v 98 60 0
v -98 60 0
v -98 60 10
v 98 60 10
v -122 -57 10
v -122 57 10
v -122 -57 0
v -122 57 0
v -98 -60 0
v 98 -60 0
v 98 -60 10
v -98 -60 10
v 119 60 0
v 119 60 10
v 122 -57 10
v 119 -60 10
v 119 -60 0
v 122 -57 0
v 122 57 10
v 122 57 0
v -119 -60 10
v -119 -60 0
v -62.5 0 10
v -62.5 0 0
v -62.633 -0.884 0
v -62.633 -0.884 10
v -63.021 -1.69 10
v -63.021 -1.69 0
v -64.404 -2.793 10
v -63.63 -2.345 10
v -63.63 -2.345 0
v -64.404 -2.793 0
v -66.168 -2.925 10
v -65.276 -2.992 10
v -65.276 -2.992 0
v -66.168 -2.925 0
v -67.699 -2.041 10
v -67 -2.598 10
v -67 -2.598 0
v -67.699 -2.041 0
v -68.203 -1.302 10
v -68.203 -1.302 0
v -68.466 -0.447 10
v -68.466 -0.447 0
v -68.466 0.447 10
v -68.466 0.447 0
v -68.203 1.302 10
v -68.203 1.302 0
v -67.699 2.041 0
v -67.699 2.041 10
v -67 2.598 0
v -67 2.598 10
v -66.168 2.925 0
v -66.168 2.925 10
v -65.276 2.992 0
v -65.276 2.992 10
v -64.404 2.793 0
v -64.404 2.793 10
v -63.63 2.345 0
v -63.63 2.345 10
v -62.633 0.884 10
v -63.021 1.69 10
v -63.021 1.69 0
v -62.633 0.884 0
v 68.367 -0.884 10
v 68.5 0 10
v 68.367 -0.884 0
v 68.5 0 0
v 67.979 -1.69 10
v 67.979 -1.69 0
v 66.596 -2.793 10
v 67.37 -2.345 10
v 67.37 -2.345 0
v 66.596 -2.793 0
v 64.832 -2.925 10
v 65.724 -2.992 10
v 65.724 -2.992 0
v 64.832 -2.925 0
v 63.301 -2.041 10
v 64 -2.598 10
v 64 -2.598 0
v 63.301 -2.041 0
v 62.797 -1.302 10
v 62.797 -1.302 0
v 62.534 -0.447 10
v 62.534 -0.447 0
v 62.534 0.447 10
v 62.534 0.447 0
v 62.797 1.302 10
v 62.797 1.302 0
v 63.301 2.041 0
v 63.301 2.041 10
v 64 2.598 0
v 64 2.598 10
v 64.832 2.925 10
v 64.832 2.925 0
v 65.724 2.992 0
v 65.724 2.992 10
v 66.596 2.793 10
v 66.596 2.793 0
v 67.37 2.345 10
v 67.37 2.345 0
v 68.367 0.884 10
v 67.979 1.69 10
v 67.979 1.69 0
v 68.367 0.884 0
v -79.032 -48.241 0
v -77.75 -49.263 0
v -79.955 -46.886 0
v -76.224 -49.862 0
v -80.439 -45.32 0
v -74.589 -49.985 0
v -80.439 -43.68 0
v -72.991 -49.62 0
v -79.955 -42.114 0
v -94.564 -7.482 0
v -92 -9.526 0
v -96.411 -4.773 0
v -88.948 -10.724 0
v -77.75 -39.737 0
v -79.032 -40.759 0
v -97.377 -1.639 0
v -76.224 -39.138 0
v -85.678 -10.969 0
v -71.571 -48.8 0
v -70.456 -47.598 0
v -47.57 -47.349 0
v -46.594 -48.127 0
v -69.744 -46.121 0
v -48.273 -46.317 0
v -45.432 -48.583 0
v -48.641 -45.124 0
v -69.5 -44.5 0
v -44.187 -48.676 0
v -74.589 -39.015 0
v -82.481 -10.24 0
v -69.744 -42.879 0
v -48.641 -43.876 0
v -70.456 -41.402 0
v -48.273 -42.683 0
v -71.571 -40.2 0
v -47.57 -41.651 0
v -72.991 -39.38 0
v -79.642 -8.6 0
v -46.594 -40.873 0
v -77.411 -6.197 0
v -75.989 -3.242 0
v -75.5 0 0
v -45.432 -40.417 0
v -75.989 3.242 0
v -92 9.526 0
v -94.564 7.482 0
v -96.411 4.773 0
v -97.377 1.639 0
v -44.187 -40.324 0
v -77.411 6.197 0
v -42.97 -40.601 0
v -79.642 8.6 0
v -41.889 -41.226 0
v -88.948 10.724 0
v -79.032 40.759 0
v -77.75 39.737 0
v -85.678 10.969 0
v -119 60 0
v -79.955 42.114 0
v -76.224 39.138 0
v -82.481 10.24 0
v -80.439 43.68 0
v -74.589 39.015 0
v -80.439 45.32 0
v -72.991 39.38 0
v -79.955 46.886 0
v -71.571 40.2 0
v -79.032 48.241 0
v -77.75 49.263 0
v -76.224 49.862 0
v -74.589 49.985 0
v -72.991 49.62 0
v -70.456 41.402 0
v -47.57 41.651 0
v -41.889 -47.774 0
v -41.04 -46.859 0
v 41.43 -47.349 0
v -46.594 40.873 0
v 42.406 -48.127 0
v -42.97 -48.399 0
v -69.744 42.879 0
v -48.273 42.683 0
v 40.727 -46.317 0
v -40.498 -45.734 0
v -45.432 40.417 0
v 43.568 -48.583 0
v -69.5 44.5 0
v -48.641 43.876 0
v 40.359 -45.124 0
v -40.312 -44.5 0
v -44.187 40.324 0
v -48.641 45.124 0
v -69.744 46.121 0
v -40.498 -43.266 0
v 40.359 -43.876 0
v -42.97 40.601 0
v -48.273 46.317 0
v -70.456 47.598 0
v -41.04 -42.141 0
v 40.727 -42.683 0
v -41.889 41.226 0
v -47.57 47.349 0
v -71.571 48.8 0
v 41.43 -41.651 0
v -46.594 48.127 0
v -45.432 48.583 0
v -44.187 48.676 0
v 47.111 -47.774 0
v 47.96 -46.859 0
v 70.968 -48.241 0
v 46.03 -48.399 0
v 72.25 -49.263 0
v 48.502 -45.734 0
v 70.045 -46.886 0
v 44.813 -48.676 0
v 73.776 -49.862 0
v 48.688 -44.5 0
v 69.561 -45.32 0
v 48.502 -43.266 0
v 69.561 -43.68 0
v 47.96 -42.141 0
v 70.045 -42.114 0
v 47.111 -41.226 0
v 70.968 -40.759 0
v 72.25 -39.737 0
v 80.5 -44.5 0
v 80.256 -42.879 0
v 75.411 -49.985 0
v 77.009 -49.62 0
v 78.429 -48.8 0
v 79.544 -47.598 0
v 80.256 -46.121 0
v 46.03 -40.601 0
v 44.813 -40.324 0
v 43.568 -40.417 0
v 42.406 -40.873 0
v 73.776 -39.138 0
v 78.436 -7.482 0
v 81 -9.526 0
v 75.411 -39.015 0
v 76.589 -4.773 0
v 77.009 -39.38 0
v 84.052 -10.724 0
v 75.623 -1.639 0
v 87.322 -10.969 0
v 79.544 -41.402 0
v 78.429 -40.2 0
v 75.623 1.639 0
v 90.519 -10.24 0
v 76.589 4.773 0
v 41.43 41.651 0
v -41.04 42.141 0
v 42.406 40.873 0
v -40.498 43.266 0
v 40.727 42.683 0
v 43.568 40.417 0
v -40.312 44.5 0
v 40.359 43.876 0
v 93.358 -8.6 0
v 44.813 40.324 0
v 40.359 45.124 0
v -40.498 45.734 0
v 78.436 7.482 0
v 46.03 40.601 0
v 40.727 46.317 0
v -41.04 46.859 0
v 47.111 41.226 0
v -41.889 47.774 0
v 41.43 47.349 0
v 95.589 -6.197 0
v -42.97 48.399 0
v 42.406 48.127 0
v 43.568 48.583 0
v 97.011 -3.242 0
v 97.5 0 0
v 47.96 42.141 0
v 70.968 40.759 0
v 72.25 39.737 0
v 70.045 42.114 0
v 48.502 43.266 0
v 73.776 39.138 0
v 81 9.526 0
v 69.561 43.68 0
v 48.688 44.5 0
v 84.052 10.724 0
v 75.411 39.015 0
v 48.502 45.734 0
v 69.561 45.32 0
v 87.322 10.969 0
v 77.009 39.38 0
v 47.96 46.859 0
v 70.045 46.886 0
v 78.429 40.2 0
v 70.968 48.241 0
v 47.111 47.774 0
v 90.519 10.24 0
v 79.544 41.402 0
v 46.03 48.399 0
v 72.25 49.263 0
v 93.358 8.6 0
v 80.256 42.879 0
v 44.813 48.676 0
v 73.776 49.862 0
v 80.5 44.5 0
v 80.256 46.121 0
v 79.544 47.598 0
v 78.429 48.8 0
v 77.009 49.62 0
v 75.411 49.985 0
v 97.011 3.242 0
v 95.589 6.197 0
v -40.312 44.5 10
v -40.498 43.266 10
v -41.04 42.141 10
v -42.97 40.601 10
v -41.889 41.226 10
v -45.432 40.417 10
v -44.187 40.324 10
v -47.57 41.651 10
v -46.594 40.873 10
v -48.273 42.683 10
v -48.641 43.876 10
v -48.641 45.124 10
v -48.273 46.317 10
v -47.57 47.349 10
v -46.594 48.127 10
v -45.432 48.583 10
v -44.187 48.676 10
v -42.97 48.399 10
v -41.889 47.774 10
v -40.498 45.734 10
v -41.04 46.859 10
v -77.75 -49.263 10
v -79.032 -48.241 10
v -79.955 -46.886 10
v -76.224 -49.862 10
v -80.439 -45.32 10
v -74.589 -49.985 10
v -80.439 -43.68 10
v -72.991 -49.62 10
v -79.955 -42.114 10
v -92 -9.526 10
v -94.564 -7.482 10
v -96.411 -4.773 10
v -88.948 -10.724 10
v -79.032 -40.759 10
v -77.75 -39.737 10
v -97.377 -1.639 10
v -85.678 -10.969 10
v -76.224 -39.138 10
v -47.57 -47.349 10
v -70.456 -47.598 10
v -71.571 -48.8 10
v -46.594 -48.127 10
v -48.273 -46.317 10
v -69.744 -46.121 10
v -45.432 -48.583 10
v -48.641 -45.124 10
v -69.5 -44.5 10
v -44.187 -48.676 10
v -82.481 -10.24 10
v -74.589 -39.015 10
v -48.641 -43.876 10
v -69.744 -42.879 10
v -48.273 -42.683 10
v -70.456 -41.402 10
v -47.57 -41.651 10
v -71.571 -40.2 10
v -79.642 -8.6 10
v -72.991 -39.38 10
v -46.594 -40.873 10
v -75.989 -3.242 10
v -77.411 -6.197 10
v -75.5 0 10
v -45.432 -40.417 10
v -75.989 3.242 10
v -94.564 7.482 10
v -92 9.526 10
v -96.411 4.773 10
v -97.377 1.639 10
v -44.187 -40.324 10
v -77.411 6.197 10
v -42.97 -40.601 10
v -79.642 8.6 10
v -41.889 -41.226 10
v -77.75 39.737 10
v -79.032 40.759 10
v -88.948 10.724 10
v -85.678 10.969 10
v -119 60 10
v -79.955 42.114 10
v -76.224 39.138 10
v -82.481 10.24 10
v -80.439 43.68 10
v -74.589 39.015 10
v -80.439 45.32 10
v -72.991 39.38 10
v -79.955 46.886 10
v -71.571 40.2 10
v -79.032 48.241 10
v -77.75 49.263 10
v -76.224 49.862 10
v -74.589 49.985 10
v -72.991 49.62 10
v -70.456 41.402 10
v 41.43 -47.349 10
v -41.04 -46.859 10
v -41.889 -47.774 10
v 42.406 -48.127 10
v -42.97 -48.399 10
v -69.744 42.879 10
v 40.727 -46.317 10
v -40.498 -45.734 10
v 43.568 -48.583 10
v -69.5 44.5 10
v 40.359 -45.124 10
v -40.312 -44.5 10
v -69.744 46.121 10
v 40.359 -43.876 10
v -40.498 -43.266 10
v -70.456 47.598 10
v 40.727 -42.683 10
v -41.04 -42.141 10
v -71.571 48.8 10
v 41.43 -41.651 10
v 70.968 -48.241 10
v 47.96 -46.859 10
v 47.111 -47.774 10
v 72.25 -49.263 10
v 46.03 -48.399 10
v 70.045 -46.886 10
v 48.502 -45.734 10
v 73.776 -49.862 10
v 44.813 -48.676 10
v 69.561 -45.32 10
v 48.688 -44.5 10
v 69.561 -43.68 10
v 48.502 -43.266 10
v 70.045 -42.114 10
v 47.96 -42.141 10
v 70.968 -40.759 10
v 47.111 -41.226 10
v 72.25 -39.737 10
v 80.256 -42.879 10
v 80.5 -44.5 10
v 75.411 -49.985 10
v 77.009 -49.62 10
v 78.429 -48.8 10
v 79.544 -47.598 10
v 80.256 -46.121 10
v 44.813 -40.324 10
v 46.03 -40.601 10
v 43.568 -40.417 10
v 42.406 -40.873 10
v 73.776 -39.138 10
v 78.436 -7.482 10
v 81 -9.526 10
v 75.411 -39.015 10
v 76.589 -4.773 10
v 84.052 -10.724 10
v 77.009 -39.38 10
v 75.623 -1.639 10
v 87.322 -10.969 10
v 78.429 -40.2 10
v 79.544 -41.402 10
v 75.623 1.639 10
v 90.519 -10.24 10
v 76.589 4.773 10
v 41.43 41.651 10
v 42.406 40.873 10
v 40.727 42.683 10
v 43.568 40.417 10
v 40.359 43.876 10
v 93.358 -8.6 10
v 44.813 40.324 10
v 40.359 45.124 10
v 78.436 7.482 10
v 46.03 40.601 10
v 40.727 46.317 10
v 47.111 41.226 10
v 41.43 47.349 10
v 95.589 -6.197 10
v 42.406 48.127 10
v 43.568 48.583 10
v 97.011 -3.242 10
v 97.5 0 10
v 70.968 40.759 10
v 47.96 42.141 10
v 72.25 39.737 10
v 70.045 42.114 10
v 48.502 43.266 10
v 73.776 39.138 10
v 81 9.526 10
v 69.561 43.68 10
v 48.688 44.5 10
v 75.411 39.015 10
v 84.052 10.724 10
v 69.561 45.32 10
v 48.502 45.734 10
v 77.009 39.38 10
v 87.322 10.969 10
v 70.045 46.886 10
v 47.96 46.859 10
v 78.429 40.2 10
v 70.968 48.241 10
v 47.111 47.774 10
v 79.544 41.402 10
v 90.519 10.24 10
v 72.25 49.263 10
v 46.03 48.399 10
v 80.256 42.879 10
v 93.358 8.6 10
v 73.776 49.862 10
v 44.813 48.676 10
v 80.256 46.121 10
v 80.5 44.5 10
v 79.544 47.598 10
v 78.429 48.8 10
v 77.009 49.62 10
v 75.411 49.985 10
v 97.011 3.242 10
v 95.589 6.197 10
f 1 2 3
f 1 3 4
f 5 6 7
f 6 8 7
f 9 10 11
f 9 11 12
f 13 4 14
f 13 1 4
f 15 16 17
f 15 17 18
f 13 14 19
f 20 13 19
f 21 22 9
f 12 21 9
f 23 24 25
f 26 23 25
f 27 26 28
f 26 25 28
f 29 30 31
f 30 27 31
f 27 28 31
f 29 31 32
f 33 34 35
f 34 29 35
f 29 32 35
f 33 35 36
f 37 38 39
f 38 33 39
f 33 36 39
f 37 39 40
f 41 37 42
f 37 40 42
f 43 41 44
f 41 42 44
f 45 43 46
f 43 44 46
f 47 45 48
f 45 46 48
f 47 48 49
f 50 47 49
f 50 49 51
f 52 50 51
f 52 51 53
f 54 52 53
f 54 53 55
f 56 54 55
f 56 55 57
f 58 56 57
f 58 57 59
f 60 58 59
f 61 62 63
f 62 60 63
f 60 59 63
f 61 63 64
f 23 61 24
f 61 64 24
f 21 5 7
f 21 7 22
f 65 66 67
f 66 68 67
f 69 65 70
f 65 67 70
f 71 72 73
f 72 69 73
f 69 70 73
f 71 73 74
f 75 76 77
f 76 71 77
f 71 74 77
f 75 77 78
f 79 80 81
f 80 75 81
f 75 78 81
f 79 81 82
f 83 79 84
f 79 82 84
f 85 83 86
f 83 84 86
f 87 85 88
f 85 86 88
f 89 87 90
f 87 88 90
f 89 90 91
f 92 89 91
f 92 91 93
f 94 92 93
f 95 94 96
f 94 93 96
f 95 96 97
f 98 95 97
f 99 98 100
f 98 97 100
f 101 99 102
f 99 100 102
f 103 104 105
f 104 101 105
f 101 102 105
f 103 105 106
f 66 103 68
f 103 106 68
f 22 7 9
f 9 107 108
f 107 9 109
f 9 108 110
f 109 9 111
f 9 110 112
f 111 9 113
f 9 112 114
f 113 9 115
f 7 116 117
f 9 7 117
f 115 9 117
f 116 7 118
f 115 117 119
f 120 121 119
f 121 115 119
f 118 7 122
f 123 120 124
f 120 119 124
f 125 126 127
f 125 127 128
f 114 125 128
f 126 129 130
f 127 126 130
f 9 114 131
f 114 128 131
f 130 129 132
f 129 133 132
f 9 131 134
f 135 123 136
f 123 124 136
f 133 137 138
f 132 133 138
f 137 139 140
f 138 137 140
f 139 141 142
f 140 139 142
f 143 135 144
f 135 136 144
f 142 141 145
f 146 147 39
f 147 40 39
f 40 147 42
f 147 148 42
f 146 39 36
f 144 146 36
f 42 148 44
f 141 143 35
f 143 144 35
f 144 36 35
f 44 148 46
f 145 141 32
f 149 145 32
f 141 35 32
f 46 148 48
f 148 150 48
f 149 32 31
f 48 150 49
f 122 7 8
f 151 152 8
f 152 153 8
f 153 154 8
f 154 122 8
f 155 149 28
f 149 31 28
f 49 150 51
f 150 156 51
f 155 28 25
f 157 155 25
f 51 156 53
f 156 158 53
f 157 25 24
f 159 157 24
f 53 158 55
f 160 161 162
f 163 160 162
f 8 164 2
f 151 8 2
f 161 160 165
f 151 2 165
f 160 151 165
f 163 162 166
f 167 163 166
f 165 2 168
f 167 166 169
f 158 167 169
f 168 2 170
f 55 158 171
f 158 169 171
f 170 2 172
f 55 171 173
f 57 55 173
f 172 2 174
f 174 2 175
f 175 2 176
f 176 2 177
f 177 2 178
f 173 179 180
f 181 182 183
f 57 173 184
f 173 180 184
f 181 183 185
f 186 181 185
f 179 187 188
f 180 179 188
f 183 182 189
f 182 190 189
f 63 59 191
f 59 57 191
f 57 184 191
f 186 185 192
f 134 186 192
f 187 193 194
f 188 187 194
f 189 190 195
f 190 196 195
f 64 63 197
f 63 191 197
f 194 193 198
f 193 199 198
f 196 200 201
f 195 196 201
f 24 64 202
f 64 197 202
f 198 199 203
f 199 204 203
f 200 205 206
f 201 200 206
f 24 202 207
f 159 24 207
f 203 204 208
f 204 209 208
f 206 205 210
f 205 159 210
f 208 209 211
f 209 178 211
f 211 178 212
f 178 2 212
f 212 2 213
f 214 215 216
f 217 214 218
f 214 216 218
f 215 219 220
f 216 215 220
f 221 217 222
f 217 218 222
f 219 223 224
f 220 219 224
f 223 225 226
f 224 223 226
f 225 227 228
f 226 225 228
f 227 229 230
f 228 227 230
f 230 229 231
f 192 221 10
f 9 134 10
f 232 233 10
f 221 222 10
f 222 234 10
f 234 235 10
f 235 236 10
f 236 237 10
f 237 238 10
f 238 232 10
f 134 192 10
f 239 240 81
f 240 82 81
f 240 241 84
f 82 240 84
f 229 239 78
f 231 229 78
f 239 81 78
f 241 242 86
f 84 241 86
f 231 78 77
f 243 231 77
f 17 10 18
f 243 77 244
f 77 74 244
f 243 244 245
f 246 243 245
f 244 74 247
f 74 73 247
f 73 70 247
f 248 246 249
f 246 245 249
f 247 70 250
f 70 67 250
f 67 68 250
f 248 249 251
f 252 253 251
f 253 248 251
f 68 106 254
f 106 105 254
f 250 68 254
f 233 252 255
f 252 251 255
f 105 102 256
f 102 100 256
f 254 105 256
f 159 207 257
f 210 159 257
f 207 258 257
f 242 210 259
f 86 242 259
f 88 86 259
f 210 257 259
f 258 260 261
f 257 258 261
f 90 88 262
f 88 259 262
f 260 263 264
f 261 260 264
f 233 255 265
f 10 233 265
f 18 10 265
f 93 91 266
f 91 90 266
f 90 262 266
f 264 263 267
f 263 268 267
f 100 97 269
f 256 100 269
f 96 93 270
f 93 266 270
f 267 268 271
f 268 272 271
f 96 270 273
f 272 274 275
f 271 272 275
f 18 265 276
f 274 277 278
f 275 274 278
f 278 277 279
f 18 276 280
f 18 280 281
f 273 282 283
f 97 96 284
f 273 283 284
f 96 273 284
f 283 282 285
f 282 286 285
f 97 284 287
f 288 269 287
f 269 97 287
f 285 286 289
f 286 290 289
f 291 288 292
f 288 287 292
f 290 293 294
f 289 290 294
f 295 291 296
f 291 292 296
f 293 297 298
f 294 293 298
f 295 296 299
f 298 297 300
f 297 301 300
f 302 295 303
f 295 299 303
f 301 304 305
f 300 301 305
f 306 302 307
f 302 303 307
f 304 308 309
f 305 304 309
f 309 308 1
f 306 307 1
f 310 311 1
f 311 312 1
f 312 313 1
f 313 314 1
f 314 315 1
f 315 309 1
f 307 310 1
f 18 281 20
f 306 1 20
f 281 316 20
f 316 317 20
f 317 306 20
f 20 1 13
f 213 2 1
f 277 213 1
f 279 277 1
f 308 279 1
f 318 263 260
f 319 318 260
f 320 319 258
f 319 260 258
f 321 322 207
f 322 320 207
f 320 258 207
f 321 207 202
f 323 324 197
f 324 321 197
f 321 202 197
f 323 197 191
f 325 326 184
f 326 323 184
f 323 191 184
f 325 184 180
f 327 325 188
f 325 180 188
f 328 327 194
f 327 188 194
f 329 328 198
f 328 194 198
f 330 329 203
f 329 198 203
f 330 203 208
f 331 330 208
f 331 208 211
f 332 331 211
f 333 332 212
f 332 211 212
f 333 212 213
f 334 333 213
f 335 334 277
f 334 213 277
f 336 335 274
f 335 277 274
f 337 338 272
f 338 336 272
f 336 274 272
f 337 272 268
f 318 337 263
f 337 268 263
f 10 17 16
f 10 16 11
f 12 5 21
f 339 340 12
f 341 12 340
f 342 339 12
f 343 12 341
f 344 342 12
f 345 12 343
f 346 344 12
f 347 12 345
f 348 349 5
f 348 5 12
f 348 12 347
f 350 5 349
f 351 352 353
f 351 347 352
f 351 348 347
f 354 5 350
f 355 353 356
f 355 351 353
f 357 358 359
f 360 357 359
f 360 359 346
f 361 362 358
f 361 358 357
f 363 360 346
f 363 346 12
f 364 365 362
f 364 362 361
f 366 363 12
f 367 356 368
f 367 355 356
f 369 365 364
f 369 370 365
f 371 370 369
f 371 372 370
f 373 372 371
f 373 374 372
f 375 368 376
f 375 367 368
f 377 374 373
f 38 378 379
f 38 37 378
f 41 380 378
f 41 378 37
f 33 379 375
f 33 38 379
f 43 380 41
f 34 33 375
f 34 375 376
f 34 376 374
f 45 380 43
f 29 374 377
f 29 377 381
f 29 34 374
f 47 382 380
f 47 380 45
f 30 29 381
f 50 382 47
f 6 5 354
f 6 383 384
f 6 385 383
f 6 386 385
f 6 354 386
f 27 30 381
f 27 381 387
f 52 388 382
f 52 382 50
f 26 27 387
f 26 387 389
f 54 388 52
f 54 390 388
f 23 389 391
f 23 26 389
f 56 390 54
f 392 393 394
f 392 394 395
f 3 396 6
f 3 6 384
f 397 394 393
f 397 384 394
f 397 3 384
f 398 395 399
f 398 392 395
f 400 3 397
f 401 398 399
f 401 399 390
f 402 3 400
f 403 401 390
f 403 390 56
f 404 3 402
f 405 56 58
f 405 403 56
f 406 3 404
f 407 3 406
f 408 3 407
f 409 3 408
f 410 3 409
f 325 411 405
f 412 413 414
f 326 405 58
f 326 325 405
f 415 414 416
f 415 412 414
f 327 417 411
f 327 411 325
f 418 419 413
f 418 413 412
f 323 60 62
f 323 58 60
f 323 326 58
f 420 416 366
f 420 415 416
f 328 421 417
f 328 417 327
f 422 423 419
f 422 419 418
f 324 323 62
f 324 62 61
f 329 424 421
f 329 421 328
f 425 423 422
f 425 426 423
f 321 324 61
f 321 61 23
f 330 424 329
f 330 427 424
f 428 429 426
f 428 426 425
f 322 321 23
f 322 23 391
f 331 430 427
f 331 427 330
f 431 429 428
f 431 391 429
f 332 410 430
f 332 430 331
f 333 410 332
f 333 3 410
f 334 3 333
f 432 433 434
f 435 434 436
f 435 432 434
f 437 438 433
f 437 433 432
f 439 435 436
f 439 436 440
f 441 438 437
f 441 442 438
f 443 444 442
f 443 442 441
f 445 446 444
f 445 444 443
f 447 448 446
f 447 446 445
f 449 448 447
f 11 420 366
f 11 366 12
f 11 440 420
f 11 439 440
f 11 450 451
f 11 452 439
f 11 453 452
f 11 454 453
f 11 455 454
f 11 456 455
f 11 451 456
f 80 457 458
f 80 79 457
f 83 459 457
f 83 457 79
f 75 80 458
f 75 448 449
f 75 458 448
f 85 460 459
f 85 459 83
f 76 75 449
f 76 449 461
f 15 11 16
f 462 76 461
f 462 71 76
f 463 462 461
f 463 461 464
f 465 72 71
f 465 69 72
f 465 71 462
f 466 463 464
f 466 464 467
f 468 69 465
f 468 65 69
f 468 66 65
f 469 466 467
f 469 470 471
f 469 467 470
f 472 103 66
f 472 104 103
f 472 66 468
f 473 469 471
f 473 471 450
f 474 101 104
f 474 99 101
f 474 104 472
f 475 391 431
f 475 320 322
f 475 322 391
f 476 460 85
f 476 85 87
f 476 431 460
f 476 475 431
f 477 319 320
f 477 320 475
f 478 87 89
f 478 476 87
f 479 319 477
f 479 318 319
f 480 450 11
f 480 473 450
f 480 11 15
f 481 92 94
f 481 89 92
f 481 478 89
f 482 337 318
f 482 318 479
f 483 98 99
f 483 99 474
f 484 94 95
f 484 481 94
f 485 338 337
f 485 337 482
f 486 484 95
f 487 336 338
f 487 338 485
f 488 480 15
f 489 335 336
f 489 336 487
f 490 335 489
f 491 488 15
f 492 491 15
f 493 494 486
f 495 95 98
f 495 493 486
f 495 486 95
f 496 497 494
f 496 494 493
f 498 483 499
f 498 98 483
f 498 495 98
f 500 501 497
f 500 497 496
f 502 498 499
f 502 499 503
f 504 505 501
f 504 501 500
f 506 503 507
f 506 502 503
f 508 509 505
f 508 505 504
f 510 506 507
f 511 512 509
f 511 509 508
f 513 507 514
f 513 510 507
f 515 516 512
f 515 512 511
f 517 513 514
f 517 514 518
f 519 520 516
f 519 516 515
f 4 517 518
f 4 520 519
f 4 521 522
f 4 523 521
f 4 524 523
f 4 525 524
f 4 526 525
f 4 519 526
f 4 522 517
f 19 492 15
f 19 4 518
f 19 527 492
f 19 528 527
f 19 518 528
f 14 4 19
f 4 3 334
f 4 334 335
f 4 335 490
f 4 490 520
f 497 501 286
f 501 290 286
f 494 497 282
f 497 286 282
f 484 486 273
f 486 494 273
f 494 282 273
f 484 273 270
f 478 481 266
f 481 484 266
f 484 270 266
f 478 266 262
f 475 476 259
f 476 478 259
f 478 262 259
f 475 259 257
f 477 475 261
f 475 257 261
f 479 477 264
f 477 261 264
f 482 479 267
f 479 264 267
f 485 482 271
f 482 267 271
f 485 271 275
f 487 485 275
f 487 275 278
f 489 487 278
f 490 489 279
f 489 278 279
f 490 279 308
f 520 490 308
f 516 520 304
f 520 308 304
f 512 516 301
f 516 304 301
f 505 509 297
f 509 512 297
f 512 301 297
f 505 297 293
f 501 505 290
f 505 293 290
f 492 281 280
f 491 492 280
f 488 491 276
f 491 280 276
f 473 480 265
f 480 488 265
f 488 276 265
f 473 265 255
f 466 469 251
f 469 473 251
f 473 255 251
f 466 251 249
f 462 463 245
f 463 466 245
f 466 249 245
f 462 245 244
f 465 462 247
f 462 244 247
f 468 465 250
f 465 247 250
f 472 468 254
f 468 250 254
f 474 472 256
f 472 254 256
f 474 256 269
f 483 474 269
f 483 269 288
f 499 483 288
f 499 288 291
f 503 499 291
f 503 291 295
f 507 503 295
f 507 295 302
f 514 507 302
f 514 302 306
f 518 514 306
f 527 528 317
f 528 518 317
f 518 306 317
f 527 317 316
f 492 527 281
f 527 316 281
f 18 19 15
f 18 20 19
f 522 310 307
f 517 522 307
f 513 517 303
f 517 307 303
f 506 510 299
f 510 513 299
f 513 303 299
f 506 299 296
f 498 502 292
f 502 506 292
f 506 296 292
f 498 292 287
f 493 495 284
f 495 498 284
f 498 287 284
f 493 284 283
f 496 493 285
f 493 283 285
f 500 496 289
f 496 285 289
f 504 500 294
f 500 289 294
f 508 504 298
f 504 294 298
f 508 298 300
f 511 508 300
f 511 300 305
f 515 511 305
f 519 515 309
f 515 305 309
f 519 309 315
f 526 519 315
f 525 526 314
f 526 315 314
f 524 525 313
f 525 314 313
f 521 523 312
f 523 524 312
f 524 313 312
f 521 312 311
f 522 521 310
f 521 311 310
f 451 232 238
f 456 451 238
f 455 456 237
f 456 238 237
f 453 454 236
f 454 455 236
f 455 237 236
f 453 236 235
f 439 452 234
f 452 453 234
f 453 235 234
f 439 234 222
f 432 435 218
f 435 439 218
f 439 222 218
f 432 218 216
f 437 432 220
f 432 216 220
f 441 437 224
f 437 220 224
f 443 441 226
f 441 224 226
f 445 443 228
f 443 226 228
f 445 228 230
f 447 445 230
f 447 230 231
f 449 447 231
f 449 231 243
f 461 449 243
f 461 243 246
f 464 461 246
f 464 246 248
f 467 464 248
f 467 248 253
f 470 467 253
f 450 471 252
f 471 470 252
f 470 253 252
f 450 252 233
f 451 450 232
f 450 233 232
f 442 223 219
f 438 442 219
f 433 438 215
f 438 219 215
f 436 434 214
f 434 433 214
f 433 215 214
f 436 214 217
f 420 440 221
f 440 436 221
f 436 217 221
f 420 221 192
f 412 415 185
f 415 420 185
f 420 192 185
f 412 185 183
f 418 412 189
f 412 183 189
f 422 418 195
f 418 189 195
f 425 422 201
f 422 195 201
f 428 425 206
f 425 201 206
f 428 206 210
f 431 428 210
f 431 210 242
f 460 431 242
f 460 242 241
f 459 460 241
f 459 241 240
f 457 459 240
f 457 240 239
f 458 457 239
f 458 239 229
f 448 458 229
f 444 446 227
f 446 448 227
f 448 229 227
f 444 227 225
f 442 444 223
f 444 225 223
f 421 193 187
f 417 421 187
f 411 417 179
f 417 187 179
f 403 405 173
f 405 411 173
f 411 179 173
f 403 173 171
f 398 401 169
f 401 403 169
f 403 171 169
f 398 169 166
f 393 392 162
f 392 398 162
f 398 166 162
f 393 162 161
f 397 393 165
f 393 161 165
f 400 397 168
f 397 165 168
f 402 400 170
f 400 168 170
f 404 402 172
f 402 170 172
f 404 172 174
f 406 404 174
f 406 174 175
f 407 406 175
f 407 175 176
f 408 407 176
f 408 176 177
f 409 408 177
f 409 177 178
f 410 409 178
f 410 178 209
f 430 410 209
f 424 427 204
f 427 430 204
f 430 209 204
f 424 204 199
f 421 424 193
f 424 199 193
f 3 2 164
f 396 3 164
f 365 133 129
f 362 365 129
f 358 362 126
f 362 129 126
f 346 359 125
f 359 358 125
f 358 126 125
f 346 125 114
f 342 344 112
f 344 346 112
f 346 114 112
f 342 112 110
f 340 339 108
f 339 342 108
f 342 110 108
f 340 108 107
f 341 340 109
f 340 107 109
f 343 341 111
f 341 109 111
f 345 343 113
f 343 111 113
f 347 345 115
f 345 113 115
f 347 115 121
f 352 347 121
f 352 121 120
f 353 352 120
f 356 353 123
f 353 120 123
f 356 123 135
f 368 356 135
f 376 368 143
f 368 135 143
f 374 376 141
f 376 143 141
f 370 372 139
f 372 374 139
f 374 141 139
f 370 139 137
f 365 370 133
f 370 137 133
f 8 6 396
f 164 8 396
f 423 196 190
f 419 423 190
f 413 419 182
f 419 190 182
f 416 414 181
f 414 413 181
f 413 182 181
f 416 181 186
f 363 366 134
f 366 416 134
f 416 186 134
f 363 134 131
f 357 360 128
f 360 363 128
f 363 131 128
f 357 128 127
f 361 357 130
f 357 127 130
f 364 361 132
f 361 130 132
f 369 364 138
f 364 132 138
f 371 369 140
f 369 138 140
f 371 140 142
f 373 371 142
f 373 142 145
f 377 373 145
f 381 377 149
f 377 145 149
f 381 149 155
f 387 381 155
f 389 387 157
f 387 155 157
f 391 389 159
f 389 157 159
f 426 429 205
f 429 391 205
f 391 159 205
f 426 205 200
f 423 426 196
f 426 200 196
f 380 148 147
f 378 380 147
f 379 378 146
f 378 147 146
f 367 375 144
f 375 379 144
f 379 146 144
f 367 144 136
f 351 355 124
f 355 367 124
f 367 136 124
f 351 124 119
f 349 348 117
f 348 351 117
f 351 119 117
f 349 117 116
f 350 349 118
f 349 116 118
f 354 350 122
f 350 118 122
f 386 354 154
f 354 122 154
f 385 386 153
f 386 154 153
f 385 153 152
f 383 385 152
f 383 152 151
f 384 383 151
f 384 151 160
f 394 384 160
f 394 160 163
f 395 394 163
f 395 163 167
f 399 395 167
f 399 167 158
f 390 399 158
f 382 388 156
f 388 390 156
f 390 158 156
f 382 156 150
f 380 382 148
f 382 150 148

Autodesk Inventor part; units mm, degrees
ref_plane "YZ Plane" through (0, 0, 0) normal (1, 0, 0) x (0, 1, 0)
ref_plane "XZ Plane" through (0, 0, 0) normal (0, 1, 0) x (-1, 0, 0)
ref_plane "XY Plane" through (0, 0, 0) normal (0, 0, 1) x (1, 0, 0)
sketch "Sketch1" plane through (0, 0, 0) normal (0, 0, 1) x (1, 0, 0)
  circle A0 centre (-86.5, 0) radius 11 projected
  circle A1 centre (86.5, 0) radius 11 projected
  circle A2 centre (-75, 44.5) radius 5.5 projected
  circle A3 centre (-75, -44.5) radius 5.5 projected
  circle A4 centre (75, 44.5) radius 5.5 projected
  circle A5 centre (75, -44.5) radius 5.5 projected
  circle A6 centre (-65.5, 0) radius 3 projected
  circle A7 centre (65.5, 0) radius 3 projected
  circle A8 centre (-44.5, 44.5) radius 4.1881 projected
  circle A9 centre (-44.5, -44.5) radius 4.1881 projected
  circle A10 centre (44.5, 44.5) radius 4.1881 projected
  circle A11 centre (44.5, -44.5) radius 4.1881 projected
  line L0 (100, -58) -> (98, -60) construction
  line L1 (100, 58) -> (100, -58) construction
  line L2 (98, 60) -> (100, 58) construction
  line L3 (-98, 60) -> (98, 60) projected
  line L4 (-100, 58) -> (-98, 60) construction
  line L5 (-100, -58) -> (-100, 58) construction
  line L6 (-98, -60) -> (-100, -58) construction
  line L7 (98, -60) -> (-98, -60) projected
  line L8 (98, 60) -> (119, 60)
  line L9 (122, 57) -> (122, -57)
  line L10 (119, -60) -> (98, -60)
  line L11 (98, -60) -> (98, 60) construction
  line L12 (-98, 60) -> (-119, 60)
  line L13 (-122, 57) -> (-122, -57)
  line L14 (-119, -60) -> (-98, -60)
  line L15 (-98, -60) -> (-98, 60) construction
  line L16 (119, 60) -> (122, 57)
  line L17 (119, -60) -> (122, -57)
  line L18 (-122, -57) -> (-119, -60)
  line L19 (-122, 57) -> (-119, 60)
  point P0 (0, 0)
  point P1 (122, -60)
  point P2 (122, 60)
  point P3 (-122, -60)
  point P4 (-122, 60)
  dimension "d4" = 3
  dimension "d5" = 3
  dimension "d6" = 3
  dimension "d7" = 3
  dimension "d8" = 3
  dimension "d9" = 3
  dimension "d10" = 3
  dimension "d11" = 3
  dimension "d12" = 22
  dimension "d13" = 22
extrude "Extrusion1" add sketch "Sketch1" along normal blind 10
equation "\"d5\" = d4"
equation "\"d6\" = d4"
equation "\"d7\" = d6"
equation "\"d8\" = d4"
equation "\"d9\" = d8"
equation "\"d10\" = d4"
equation "\"d11\" = d10"
equation "\"d13\" = d12"
properties part number "TilesGrip"
